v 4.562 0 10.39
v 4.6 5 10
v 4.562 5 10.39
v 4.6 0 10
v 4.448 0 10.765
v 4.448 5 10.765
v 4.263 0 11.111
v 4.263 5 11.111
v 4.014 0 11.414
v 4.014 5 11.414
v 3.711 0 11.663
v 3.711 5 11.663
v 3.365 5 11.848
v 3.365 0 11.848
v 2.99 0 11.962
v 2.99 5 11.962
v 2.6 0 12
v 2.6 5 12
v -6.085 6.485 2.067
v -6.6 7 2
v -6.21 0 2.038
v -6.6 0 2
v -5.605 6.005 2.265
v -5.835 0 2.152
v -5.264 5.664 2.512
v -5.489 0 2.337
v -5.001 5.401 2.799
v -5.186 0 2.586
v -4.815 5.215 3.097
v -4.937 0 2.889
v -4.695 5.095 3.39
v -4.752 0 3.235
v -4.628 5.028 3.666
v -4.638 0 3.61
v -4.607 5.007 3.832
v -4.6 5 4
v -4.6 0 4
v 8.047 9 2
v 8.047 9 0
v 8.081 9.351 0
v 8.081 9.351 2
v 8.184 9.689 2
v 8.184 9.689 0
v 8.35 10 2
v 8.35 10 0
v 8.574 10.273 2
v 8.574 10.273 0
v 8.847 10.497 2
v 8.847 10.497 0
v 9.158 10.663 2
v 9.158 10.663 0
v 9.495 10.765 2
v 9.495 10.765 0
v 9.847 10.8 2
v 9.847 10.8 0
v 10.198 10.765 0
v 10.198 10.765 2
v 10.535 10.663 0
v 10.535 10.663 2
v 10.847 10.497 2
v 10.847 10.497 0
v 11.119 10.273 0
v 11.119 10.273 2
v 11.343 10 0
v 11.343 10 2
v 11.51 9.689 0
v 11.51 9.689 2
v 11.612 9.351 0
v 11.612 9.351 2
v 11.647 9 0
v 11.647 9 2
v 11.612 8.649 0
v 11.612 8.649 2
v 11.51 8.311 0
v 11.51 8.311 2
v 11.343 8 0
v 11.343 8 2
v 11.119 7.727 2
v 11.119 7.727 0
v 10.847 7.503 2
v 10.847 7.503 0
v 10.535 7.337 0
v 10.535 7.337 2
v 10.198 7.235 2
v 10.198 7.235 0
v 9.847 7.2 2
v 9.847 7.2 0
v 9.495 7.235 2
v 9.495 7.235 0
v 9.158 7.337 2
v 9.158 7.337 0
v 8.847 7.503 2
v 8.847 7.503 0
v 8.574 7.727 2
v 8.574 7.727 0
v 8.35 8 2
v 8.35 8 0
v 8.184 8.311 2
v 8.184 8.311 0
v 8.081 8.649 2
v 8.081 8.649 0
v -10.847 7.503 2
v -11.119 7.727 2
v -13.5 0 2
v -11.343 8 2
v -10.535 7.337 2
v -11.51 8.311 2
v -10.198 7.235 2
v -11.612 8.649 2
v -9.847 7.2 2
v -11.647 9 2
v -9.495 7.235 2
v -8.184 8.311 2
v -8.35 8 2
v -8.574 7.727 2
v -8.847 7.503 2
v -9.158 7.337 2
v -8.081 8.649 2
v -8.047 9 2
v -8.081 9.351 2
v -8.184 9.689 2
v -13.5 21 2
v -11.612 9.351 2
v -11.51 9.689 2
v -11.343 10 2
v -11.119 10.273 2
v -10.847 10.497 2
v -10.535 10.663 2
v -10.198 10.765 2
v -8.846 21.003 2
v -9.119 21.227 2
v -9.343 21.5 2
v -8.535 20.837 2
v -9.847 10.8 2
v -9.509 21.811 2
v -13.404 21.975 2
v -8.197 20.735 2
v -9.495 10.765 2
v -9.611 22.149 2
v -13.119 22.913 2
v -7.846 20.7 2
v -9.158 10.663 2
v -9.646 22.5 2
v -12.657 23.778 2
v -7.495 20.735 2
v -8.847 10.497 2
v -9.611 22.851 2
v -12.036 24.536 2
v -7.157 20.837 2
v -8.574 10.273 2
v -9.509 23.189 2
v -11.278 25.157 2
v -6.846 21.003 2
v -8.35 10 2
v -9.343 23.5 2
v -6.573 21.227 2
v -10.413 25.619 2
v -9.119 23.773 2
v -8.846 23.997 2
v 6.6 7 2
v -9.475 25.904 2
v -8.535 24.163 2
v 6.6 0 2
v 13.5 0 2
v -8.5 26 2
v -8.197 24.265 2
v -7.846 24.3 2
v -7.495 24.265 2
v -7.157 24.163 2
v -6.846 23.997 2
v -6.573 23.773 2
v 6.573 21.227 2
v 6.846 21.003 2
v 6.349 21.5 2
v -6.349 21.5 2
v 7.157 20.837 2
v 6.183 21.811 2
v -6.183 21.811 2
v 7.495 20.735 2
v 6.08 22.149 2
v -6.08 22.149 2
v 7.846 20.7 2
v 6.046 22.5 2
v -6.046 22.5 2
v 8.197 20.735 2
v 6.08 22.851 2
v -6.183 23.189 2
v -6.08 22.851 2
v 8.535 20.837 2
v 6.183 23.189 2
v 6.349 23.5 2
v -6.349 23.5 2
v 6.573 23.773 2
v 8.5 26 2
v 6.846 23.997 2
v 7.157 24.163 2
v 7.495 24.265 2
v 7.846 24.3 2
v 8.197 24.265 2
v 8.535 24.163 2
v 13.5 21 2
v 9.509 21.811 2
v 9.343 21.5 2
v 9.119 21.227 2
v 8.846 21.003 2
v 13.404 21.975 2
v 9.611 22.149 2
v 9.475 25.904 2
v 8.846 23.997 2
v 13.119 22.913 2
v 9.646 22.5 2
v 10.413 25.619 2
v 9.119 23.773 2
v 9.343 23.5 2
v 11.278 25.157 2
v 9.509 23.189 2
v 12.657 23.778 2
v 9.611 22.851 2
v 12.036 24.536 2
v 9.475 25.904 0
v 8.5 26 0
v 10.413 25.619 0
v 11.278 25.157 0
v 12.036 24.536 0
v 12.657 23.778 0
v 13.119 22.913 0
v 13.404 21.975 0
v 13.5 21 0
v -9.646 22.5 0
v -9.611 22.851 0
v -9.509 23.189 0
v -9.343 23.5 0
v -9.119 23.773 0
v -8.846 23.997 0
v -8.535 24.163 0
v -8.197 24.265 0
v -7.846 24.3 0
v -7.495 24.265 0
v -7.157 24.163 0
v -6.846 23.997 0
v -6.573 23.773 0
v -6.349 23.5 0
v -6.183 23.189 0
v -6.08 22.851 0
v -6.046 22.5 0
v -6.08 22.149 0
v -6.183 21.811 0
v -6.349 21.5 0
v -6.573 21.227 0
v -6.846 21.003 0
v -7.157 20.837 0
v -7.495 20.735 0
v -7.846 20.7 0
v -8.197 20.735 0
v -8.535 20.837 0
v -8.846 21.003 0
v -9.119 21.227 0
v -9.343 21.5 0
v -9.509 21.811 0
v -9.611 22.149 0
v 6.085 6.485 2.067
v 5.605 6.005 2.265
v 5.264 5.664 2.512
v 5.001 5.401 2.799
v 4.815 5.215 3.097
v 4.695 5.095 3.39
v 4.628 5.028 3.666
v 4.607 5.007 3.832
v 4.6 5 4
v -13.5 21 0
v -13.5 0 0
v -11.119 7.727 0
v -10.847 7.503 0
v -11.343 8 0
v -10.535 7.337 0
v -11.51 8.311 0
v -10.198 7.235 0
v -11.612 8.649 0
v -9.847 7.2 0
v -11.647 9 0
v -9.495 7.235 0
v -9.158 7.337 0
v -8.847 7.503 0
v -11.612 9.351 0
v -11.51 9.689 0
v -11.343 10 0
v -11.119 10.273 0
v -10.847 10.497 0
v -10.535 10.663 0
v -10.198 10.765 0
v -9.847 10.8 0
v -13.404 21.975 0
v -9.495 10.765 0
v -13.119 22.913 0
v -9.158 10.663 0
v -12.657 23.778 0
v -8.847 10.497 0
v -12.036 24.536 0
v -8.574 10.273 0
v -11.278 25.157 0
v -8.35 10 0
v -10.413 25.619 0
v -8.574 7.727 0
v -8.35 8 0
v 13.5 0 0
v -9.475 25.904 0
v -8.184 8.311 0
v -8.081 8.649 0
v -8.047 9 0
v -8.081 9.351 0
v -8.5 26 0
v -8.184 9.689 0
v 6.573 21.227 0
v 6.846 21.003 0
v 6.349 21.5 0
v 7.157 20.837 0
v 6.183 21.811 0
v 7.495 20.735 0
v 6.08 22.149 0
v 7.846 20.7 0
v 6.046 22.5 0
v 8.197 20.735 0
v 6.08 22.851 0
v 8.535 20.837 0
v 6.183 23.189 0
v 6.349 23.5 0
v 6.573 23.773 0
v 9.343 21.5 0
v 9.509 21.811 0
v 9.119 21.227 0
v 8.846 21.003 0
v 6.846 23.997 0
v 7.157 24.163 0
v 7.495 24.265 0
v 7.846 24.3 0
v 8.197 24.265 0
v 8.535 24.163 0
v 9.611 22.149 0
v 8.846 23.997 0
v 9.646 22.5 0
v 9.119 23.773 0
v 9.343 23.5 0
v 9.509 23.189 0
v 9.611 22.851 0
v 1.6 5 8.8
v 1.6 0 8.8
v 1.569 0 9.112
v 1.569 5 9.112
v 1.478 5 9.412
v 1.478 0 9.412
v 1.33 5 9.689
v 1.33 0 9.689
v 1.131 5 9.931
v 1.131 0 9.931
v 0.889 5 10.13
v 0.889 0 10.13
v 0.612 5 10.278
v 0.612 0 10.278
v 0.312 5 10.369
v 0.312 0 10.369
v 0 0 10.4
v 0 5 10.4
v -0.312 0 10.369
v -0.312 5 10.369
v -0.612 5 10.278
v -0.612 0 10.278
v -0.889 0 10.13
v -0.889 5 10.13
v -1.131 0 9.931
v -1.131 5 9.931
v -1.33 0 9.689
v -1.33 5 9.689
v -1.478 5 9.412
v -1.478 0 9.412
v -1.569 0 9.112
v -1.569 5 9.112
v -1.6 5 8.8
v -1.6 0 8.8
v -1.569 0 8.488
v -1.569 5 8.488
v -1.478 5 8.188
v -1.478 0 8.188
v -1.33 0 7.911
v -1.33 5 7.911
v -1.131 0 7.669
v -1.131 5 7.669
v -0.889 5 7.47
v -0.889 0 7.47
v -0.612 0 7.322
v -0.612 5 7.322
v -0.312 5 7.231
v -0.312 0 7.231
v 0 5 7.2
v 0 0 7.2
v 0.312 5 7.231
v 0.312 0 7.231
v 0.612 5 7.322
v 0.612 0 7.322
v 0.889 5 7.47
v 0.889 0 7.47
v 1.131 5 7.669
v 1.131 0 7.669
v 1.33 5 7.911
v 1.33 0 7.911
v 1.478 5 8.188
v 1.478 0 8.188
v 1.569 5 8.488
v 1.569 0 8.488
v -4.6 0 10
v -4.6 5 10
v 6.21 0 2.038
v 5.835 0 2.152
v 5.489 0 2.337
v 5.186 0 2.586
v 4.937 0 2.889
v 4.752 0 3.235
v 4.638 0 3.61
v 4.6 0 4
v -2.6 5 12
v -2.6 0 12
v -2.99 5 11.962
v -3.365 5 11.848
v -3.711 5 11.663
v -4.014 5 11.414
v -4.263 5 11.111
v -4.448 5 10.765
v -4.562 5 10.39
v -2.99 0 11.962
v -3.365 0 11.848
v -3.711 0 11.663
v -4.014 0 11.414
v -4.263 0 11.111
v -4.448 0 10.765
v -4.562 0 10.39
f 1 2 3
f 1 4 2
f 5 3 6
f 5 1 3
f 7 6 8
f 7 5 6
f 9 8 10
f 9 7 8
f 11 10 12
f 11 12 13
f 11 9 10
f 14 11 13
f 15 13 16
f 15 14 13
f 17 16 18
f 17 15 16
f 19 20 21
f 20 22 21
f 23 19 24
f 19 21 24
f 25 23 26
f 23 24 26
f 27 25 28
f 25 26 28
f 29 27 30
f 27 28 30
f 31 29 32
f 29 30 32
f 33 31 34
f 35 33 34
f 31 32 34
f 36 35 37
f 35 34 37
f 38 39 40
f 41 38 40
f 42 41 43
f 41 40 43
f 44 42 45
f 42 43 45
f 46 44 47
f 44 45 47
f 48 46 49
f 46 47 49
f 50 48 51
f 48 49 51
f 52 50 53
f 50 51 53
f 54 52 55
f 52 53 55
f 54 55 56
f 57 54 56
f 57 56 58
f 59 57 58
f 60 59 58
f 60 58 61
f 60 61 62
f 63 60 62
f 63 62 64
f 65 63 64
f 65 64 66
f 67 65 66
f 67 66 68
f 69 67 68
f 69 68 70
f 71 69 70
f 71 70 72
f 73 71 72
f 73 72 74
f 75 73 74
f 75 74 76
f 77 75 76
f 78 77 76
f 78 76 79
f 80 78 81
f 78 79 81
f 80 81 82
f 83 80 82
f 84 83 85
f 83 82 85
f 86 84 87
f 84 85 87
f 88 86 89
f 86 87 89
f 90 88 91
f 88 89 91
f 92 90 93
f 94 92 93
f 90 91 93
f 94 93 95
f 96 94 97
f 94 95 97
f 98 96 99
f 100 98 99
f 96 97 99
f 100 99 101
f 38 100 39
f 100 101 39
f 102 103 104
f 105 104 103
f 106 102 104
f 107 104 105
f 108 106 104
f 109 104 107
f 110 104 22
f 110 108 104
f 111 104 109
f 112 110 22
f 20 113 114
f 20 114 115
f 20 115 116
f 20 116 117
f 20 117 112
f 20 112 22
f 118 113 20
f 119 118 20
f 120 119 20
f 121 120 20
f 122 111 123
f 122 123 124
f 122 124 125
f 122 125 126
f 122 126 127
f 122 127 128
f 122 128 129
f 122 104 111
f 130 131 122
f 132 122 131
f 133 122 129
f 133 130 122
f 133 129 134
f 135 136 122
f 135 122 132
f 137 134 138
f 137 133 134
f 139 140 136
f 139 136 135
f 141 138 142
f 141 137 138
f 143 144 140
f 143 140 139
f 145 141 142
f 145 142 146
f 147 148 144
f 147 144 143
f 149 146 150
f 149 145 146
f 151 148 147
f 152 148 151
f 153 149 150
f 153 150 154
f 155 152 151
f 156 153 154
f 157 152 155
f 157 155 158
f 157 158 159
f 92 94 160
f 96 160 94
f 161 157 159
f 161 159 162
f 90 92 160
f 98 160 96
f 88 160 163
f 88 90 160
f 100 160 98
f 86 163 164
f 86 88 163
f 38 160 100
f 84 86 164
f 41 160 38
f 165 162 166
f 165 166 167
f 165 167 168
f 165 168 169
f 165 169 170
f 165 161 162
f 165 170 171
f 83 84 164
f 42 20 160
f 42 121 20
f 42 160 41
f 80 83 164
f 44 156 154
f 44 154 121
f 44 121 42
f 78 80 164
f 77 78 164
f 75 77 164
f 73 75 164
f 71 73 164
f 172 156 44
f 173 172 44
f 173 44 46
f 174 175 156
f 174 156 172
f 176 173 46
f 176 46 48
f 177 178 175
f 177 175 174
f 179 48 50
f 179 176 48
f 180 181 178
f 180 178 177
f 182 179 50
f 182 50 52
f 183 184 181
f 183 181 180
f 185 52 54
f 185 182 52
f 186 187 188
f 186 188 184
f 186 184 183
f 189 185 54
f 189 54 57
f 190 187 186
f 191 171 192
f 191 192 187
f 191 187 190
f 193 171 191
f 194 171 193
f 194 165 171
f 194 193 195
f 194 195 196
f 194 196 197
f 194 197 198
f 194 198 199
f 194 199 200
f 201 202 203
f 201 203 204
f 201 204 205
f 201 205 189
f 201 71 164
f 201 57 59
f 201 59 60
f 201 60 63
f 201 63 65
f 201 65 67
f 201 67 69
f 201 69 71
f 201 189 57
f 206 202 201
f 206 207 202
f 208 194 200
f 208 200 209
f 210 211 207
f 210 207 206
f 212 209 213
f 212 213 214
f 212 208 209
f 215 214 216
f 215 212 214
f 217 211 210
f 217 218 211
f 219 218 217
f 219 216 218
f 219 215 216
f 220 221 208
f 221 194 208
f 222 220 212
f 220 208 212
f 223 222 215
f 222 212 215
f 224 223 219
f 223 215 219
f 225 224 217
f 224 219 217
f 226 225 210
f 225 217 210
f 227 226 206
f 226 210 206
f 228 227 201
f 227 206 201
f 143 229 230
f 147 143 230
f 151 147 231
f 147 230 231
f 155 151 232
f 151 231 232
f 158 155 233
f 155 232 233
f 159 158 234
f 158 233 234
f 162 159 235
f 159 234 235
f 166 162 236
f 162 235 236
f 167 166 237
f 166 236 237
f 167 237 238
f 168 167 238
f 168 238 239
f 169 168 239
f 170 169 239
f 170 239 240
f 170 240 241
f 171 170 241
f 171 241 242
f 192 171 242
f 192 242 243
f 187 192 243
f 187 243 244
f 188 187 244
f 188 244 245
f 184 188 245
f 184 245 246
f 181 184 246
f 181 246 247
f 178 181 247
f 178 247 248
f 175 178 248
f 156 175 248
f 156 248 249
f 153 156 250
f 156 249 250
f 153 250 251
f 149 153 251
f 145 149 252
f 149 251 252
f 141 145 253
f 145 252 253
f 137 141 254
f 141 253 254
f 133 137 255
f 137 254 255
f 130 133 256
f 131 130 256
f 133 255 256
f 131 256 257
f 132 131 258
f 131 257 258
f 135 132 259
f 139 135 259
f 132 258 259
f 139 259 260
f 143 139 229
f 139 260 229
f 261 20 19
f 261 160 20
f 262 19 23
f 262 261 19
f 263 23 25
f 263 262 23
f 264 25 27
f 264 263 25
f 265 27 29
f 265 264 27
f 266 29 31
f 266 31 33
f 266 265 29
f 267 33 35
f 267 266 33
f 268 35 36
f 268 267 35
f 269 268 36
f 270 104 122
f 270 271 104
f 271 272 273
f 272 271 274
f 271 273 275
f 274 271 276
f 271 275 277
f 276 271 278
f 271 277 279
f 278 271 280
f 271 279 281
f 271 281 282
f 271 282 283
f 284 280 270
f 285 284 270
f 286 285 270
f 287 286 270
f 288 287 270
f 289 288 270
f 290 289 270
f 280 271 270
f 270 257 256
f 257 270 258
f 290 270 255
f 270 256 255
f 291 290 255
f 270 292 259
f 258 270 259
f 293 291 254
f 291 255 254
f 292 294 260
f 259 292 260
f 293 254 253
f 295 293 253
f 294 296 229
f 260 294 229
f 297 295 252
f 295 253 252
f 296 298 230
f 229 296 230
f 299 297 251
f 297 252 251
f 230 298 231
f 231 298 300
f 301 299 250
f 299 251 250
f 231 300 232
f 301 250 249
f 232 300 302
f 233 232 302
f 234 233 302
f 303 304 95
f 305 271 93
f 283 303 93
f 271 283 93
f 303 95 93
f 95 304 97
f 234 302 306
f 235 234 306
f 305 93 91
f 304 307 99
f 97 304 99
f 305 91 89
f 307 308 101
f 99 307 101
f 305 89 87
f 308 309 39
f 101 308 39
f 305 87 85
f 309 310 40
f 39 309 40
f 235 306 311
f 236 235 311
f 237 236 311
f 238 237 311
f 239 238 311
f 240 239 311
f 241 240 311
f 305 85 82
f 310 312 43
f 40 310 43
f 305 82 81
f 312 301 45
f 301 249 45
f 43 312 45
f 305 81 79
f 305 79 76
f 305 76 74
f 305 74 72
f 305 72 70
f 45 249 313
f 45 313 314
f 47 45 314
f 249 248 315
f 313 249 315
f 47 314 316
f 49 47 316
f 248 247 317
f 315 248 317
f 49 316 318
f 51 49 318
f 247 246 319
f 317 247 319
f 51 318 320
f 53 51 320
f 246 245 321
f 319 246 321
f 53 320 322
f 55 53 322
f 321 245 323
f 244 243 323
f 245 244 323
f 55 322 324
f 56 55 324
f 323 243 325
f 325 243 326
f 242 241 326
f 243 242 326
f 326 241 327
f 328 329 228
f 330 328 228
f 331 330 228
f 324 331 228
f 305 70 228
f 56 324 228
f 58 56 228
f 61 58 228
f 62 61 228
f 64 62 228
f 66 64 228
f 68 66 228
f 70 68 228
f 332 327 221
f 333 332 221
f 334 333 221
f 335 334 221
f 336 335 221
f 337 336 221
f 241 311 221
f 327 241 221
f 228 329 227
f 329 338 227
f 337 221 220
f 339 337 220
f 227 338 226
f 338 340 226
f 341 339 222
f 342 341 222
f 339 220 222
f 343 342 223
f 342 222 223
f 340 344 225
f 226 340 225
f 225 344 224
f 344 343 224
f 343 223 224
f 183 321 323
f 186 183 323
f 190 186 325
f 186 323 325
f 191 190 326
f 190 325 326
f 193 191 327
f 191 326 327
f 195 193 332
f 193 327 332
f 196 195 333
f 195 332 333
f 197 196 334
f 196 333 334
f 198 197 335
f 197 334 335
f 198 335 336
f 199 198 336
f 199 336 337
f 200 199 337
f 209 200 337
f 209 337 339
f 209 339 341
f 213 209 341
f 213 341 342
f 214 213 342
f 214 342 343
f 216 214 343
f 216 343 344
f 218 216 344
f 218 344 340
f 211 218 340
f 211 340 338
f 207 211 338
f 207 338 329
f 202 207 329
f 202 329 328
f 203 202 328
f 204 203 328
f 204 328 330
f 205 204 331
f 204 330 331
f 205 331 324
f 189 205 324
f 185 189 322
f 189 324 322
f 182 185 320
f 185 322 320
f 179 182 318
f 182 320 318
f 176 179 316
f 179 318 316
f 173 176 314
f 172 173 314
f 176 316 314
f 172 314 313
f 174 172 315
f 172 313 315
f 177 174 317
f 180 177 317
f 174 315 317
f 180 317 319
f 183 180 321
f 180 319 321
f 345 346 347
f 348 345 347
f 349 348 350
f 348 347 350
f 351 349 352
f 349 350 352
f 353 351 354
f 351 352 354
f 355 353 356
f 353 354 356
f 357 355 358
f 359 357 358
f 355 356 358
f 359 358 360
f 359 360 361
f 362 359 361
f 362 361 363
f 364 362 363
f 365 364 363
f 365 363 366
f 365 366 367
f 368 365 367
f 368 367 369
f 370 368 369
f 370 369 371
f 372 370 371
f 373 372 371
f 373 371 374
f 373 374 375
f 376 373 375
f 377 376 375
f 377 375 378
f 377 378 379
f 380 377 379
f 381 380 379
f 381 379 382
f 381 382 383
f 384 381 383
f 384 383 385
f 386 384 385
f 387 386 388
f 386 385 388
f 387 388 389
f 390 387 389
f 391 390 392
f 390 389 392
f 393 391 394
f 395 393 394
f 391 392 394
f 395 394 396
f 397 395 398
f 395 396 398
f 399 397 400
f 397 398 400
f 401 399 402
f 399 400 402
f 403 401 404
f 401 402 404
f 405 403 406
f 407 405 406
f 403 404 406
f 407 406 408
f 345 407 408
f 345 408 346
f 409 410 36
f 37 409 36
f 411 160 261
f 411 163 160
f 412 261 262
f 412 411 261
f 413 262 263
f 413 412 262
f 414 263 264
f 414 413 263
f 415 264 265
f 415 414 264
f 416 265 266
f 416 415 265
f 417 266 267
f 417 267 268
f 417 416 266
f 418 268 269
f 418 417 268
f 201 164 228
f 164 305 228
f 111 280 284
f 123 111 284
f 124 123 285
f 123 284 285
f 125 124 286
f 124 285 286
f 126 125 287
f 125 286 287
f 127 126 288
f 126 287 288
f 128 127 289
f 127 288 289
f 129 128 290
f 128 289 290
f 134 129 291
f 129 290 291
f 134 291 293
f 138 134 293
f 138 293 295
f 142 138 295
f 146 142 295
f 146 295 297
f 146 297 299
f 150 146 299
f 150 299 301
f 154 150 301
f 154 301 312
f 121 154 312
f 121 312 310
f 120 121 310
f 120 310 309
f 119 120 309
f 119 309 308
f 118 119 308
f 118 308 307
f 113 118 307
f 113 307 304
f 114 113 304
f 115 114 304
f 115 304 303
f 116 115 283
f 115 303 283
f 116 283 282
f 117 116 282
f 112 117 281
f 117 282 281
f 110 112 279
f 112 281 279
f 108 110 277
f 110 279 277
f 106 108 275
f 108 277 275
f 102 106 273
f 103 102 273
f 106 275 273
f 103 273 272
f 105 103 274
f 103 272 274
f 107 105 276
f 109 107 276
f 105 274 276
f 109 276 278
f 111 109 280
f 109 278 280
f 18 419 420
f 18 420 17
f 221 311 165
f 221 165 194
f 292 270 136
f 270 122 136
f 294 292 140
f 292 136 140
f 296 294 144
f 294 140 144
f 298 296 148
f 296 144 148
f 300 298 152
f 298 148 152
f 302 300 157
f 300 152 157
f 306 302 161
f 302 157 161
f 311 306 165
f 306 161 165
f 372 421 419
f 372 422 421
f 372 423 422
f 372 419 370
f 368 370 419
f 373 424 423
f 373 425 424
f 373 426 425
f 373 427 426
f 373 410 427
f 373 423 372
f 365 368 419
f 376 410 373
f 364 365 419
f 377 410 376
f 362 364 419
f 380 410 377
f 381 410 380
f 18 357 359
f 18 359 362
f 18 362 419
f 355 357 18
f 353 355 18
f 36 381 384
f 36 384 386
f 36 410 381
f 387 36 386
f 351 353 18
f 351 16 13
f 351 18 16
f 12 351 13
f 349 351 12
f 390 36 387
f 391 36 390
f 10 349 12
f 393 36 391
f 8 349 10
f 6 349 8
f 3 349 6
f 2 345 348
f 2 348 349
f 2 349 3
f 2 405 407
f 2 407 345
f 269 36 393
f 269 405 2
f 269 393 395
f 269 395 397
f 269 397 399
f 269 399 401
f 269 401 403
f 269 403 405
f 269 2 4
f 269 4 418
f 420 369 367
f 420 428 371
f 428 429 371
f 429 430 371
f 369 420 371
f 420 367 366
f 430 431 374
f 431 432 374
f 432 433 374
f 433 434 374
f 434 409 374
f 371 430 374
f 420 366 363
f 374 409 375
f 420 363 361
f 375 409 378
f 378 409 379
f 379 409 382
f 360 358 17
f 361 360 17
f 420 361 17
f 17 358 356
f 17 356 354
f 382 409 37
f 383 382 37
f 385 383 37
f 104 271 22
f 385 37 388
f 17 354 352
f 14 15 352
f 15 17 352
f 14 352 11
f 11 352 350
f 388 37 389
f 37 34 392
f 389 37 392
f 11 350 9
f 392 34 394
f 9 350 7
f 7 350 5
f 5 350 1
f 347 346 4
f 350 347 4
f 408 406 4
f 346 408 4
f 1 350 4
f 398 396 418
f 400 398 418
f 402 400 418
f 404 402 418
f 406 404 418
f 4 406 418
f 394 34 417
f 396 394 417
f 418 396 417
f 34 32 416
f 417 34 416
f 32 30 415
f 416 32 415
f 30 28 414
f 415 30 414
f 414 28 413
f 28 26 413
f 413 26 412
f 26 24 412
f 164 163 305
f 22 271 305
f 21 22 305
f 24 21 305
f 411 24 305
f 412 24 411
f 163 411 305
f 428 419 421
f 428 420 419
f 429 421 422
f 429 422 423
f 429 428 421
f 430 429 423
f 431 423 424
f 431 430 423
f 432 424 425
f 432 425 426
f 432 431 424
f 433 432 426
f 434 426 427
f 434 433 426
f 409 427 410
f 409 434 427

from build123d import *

# Parameters (mm, degrees)
SKETCH1_W           = 27
SKETCH1_H           = 26
BOSS_EXTRUDE1_DEPTH = 2
SKETCH2_W           = 27
SKETCH2_H           = 5
BOSS_EXTRUDE2_DEPTH = 10
CUT_EXTRUDE1_REACH  = 28
SKETCH3_R           = 1.6
SKETCH4_W           = 8.9
SKETCH4_H           = 10
CUT_EXTRUDE2_DEPTH  = 5
CUT_EXTRUDE3_REACH  = 14
SKETCH5_R           = 1.8
FILLET1_R           = 5
FILLET2_R           = 2
FILLET3_R           = 2


with BuildPart() as part:
    # Sketch1 → Boss-Extrude1 (new body)
    with BuildSketch(Plane.XY):
        with Locations((0, 13)):
            Rectangle(SKETCH1_W, SKETCH1_H)
    extrude(amount=BOSS_EXTRUDE1_DEPTH)

    # Sketch2 → Boss-Extrude2 (add)
    with BuildSketch(Plane.XY.offset(2)):
        with Locations((0, 2.5)):
            Rectangle(SKETCH2_W, SKETCH2_H)
    extrude(amount=BOSS_EXTRUDE2_DEPTH)

    # Sketch3 → Cut-Extrude1 (cut, up to next)
    with BuildSketch(Plane.XZ, mode=Mode.PRIVATE) as cut_extrude1_sk1:
        with Locations((0, 8.8)):
            Circle(SKETCH3_R)
    cut_extrude1_tool1 = extrude(cut_extrude1_sk1.sketch, amount=-CUT_EXTRUDE1_REACH, mode=Mode.PRIVATE) & part.part
    add(cut_extrude1_tool1.solids().sort_by_distance((0, 0, 8.8))[0], mode=Mode.SUBTRACT)

    # Sketch4 → Cut-Extrude2 (cut)
    with BuildSketch(Plane(origin=(0, 5, 0), x_dir=(1, 0, 0), z_dir=(0, 1, 0))):
        with Locations((9.05, -7)):
            Rectangle(SKETCH4_W, SKETCH4_H)
    cut_extrude2 = extrude(amount=-CUT_EXTRUDE2_DEPTH, mode=Mode.SUBTRACT)

    # Mirror1: Cut-Extrude2 across plane
    add(cut_extrude2.mirror(Plane(origin=(0, 0, 0), x_dir=(0, 0, 1), z_dir=(1, 0, 0))), mode=Mode.SUBTRACT)

    # Sketch5 → Cut-Extrude3 (cut, up to next)
    with BuildSketch(Plane(origin=(0, 0, 0), x_dir=(-1, 0, 0), z_dir=(0, 0, -1)), mode=Mode.PRIVATE) as cut_extrude3_sk1:
        with Locations((-7.845874534, 22.5)):
            Circle(SKETCH5_R)
    cut_extrude3_tool1 = extrude(cut_extrude3_sk1.sketch, amount=-CUT_EXTRUDE3_REACH, mode=Mode.PRIVATE) & part.part
    add(cut_extrude3_tool1.solids().sort_by_distance((7.845875, 22.5, 0))[0], mode=Mode.SUBTRACT)
    # Sketch5 → Cut-Extrude3 (cut, up to next)
    with BuildSketch(Plane(origin=(0, 0, 0), x_dir=(-1, 0, 0), z_dir=(0, 0, -1)), mode=Mode.PRIVATE) as cut_extrude3_sk2:
        with Locations((7.845874534, 22.5)):
            Circle(SKETCH5_R)
    cut_extrude3_tool2 = extrude(cut_extrude3_sk2.sketch, amount=-CUT_EXTRUDE3_REACH, mode=Mode.PRIVATE) & part.part
    add(cut_extrude3_tool2.solids().sort_by_distance((-7.845875, 22.5, 0))[0], mode=Mode.SUBTRACT)
    # Sketch5 → Cut-Extrude3 (cut, up to next)
    with BuildSketch(Plane(origin=(0, 0, 0), x_dir=(-1, 0, 0), z_dir=(0, 0, -1)), mode=Mode.PRIVATE) as cut_extrude3_sk3:
        with Locations((-9.846580197, 9)):
            Circle(SKETCH5_R)
    cut_extrude3_tool3 = extrude(cut_extrude3_sk3.sketch, amount=-CUT_EXTRUDE3_REACH, mode=Mode.PRIVATE) & part.part
    add(cut_extrude3_tool3.solids().sort_by_distance((9.84658, 9, 0))[0], mode=Mode.SUBTRACT)
    # Sketch5 → Cut-Extrude3 (cut, up to next)
    with BuildSketch(Plane(origin=(0, 0, 0), x_dir=(-1, 0, 0), z_dir=(0, 0, -1)), mode=Mode.PRIVATE) as cut_extrude3_sk4:
        with Locations((9.846580197, 9)):
            Circle(SKETCH5_R)
    cut_extrude3_tool4 = extrude(cut_extrude3_sk4.sketch, amount=-CUT_EXTRUDE3_REACH, mode=Mode.PRIVATE) & part.part
    add(cut_extrude3_tool4.solids().sort_by_distance((-9.84658, 9, 0))[0], mode=Mode.SUBTRACT)

    # Fillet1
    fillet1_edges = [part.edges().sort_by_distance(p)[0] for p in [
        (-13.5, 26, 1),
        (13.5, 26, 1),
    ]]
    fillet(fillet1_edges, radius=FILLET1_R)

    # Fillet2
    fillet2_edges = [part.edges().sort_by_distance(p)[0] for p in [
        (0, 5, 2),
        (4.6, 2.5, 2),
        (-4.6, 2.5, 2),
    ]]
    fillet(fillet2_edges, radius=FILLET2_R)

    # Fillet3
    fillet3_edges = [part.edges().sort_by_distance(p)[0] for p in [
        (4.6, 2.5, 12),
        (-4.6, 2.5, 12),
    ]]
    fillet(fillet3_edges, radius=FILLET3_R)


solid = part.part
